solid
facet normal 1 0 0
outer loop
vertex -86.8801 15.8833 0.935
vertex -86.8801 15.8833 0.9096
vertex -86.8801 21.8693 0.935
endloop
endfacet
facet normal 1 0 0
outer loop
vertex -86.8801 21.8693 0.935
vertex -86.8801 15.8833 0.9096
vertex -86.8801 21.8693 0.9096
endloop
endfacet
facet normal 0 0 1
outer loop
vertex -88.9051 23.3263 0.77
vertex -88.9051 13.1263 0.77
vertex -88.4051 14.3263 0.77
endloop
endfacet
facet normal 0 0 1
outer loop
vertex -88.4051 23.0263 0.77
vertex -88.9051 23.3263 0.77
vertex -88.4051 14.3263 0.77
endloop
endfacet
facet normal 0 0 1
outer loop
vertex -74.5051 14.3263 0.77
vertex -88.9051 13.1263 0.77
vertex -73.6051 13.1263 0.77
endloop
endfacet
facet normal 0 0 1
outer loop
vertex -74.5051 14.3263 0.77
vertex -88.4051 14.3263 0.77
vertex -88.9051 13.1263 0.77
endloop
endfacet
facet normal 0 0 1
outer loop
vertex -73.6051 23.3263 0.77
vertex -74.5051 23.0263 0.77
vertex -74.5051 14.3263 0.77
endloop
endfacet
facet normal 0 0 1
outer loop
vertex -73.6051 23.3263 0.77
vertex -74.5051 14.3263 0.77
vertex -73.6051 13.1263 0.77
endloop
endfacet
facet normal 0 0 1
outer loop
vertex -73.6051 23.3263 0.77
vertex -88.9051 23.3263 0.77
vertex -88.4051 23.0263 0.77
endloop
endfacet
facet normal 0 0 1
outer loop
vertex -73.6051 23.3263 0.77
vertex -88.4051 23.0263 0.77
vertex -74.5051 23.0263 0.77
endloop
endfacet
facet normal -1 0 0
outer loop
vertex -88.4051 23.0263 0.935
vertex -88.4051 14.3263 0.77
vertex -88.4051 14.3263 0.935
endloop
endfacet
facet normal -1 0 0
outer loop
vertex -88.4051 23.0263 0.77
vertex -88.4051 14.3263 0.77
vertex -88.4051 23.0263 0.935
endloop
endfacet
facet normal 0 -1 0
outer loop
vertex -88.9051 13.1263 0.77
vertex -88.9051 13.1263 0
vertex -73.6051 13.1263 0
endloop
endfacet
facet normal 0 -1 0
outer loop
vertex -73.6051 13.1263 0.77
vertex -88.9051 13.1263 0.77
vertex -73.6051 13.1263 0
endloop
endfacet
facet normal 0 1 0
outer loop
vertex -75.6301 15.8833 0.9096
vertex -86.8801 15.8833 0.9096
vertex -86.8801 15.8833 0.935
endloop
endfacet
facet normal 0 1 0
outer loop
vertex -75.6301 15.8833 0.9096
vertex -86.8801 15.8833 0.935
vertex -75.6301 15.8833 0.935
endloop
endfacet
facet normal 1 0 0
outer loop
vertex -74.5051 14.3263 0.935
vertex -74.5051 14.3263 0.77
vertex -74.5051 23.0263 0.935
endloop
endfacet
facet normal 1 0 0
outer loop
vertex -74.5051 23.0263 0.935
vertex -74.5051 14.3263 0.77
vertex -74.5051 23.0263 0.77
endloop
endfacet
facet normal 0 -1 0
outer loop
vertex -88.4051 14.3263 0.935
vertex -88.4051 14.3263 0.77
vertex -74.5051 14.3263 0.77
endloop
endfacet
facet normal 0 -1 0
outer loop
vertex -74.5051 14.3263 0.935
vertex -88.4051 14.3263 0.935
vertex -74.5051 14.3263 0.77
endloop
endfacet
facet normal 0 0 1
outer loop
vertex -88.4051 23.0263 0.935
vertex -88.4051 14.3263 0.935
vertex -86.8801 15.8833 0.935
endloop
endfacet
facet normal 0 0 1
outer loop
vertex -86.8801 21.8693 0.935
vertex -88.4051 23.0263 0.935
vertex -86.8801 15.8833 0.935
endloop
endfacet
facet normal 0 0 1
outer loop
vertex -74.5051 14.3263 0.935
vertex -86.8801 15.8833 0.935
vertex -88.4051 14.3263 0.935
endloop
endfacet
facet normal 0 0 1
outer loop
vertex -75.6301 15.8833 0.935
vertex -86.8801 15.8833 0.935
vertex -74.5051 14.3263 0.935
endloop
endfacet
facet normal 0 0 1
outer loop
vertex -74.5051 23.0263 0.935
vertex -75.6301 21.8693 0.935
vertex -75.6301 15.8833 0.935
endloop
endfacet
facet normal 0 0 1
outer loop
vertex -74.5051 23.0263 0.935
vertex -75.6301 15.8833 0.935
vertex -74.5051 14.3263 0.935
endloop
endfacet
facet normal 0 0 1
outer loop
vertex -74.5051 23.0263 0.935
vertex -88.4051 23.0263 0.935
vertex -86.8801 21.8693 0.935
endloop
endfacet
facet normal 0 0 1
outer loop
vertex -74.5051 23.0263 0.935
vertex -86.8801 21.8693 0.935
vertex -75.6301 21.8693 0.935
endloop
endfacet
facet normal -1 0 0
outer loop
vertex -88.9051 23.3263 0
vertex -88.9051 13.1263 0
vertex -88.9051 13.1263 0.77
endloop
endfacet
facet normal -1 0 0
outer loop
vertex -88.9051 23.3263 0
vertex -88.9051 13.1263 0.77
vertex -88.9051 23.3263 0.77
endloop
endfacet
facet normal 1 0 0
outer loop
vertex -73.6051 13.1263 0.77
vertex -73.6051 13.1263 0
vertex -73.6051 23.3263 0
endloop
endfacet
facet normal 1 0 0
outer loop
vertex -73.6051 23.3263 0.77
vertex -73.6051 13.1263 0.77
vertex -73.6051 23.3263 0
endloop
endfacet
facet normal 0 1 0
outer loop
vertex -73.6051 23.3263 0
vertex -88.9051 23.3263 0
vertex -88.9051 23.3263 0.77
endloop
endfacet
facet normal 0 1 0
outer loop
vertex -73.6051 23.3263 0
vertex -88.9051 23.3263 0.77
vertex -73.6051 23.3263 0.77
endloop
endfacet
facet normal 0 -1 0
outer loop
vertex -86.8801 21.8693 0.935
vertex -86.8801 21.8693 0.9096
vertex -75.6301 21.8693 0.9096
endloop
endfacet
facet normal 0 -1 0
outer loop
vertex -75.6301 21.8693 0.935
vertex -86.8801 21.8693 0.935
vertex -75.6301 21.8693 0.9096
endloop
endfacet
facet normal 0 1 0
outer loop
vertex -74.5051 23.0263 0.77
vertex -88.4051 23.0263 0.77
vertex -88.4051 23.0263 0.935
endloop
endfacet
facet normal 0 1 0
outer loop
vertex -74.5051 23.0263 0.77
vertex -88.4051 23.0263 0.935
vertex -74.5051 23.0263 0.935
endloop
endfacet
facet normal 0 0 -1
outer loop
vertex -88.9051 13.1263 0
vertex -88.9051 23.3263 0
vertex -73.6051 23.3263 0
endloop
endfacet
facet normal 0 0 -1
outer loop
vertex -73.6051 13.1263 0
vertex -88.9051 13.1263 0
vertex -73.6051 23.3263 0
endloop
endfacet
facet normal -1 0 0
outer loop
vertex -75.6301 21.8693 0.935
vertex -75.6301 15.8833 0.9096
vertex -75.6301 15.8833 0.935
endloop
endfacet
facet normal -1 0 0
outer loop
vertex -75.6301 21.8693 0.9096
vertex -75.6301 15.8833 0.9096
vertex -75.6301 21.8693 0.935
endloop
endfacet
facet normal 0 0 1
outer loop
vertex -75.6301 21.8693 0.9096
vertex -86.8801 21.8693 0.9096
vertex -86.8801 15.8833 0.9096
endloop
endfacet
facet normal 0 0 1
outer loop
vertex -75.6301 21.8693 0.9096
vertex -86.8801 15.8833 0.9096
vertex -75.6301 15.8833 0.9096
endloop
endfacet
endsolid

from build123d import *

# Parameters (mm, degrees)
SKETCH1_W           = 15.3
SKETCH1_H           = 10.2
BOSS_EXTRUDE1_DEPTH = 0.769999908
SKETCH2_W           = 13.9
SKETCH2_H           = 8.7
BOSS_EXTRUDE2_DEPTH = 0.165
WRAP1_START         = -0.0254
WRAP1_OUTLINE_W     = 11.25
WRAP1_OUTLINE_H     = 5.986
WRAP1_DEPTH         = 0.0254


# Read off the part's stored shape, not the designer's step: Wrap1
with BuildPart() as part:
    # Sketch1 → Boss-Extrude1 (new body)
    with BuildSketch(Plane.XY):
        with Locations((-81.255128869, 18.226331852)):
            Rectangle(SKETCH1_W, SKETCH1_H)
    extrude(amount=BOSS_EXTRUDE1_DEPTH)

    # Sketch2 → Boss-Extrude2 (add)
    with BuildSketch(Plane.XY.offset(0.769999908)):
        with Locations((-81.455128869, 18.676331852)):
            Rectangle(SKETCH2_W, SKETCH2_H)
    extrude(amount=BOSS_EXTRUDE2_DEPTH)

    # Wrap1 outline → Wrap1 (cut)
    with BuildSketch(Plane.XY.offset(0.934999908).offset(WRAP1_START)):
        with Locations((-81.255128869, 18.876331852)):
            Rectangle(WRAP1_OUTLINE_W, WRAP1_OUTLINE_H)
    extrude(amount=WRAP1_DEPTH, mode=Mode.SUBTRACT)


solid = part.part
